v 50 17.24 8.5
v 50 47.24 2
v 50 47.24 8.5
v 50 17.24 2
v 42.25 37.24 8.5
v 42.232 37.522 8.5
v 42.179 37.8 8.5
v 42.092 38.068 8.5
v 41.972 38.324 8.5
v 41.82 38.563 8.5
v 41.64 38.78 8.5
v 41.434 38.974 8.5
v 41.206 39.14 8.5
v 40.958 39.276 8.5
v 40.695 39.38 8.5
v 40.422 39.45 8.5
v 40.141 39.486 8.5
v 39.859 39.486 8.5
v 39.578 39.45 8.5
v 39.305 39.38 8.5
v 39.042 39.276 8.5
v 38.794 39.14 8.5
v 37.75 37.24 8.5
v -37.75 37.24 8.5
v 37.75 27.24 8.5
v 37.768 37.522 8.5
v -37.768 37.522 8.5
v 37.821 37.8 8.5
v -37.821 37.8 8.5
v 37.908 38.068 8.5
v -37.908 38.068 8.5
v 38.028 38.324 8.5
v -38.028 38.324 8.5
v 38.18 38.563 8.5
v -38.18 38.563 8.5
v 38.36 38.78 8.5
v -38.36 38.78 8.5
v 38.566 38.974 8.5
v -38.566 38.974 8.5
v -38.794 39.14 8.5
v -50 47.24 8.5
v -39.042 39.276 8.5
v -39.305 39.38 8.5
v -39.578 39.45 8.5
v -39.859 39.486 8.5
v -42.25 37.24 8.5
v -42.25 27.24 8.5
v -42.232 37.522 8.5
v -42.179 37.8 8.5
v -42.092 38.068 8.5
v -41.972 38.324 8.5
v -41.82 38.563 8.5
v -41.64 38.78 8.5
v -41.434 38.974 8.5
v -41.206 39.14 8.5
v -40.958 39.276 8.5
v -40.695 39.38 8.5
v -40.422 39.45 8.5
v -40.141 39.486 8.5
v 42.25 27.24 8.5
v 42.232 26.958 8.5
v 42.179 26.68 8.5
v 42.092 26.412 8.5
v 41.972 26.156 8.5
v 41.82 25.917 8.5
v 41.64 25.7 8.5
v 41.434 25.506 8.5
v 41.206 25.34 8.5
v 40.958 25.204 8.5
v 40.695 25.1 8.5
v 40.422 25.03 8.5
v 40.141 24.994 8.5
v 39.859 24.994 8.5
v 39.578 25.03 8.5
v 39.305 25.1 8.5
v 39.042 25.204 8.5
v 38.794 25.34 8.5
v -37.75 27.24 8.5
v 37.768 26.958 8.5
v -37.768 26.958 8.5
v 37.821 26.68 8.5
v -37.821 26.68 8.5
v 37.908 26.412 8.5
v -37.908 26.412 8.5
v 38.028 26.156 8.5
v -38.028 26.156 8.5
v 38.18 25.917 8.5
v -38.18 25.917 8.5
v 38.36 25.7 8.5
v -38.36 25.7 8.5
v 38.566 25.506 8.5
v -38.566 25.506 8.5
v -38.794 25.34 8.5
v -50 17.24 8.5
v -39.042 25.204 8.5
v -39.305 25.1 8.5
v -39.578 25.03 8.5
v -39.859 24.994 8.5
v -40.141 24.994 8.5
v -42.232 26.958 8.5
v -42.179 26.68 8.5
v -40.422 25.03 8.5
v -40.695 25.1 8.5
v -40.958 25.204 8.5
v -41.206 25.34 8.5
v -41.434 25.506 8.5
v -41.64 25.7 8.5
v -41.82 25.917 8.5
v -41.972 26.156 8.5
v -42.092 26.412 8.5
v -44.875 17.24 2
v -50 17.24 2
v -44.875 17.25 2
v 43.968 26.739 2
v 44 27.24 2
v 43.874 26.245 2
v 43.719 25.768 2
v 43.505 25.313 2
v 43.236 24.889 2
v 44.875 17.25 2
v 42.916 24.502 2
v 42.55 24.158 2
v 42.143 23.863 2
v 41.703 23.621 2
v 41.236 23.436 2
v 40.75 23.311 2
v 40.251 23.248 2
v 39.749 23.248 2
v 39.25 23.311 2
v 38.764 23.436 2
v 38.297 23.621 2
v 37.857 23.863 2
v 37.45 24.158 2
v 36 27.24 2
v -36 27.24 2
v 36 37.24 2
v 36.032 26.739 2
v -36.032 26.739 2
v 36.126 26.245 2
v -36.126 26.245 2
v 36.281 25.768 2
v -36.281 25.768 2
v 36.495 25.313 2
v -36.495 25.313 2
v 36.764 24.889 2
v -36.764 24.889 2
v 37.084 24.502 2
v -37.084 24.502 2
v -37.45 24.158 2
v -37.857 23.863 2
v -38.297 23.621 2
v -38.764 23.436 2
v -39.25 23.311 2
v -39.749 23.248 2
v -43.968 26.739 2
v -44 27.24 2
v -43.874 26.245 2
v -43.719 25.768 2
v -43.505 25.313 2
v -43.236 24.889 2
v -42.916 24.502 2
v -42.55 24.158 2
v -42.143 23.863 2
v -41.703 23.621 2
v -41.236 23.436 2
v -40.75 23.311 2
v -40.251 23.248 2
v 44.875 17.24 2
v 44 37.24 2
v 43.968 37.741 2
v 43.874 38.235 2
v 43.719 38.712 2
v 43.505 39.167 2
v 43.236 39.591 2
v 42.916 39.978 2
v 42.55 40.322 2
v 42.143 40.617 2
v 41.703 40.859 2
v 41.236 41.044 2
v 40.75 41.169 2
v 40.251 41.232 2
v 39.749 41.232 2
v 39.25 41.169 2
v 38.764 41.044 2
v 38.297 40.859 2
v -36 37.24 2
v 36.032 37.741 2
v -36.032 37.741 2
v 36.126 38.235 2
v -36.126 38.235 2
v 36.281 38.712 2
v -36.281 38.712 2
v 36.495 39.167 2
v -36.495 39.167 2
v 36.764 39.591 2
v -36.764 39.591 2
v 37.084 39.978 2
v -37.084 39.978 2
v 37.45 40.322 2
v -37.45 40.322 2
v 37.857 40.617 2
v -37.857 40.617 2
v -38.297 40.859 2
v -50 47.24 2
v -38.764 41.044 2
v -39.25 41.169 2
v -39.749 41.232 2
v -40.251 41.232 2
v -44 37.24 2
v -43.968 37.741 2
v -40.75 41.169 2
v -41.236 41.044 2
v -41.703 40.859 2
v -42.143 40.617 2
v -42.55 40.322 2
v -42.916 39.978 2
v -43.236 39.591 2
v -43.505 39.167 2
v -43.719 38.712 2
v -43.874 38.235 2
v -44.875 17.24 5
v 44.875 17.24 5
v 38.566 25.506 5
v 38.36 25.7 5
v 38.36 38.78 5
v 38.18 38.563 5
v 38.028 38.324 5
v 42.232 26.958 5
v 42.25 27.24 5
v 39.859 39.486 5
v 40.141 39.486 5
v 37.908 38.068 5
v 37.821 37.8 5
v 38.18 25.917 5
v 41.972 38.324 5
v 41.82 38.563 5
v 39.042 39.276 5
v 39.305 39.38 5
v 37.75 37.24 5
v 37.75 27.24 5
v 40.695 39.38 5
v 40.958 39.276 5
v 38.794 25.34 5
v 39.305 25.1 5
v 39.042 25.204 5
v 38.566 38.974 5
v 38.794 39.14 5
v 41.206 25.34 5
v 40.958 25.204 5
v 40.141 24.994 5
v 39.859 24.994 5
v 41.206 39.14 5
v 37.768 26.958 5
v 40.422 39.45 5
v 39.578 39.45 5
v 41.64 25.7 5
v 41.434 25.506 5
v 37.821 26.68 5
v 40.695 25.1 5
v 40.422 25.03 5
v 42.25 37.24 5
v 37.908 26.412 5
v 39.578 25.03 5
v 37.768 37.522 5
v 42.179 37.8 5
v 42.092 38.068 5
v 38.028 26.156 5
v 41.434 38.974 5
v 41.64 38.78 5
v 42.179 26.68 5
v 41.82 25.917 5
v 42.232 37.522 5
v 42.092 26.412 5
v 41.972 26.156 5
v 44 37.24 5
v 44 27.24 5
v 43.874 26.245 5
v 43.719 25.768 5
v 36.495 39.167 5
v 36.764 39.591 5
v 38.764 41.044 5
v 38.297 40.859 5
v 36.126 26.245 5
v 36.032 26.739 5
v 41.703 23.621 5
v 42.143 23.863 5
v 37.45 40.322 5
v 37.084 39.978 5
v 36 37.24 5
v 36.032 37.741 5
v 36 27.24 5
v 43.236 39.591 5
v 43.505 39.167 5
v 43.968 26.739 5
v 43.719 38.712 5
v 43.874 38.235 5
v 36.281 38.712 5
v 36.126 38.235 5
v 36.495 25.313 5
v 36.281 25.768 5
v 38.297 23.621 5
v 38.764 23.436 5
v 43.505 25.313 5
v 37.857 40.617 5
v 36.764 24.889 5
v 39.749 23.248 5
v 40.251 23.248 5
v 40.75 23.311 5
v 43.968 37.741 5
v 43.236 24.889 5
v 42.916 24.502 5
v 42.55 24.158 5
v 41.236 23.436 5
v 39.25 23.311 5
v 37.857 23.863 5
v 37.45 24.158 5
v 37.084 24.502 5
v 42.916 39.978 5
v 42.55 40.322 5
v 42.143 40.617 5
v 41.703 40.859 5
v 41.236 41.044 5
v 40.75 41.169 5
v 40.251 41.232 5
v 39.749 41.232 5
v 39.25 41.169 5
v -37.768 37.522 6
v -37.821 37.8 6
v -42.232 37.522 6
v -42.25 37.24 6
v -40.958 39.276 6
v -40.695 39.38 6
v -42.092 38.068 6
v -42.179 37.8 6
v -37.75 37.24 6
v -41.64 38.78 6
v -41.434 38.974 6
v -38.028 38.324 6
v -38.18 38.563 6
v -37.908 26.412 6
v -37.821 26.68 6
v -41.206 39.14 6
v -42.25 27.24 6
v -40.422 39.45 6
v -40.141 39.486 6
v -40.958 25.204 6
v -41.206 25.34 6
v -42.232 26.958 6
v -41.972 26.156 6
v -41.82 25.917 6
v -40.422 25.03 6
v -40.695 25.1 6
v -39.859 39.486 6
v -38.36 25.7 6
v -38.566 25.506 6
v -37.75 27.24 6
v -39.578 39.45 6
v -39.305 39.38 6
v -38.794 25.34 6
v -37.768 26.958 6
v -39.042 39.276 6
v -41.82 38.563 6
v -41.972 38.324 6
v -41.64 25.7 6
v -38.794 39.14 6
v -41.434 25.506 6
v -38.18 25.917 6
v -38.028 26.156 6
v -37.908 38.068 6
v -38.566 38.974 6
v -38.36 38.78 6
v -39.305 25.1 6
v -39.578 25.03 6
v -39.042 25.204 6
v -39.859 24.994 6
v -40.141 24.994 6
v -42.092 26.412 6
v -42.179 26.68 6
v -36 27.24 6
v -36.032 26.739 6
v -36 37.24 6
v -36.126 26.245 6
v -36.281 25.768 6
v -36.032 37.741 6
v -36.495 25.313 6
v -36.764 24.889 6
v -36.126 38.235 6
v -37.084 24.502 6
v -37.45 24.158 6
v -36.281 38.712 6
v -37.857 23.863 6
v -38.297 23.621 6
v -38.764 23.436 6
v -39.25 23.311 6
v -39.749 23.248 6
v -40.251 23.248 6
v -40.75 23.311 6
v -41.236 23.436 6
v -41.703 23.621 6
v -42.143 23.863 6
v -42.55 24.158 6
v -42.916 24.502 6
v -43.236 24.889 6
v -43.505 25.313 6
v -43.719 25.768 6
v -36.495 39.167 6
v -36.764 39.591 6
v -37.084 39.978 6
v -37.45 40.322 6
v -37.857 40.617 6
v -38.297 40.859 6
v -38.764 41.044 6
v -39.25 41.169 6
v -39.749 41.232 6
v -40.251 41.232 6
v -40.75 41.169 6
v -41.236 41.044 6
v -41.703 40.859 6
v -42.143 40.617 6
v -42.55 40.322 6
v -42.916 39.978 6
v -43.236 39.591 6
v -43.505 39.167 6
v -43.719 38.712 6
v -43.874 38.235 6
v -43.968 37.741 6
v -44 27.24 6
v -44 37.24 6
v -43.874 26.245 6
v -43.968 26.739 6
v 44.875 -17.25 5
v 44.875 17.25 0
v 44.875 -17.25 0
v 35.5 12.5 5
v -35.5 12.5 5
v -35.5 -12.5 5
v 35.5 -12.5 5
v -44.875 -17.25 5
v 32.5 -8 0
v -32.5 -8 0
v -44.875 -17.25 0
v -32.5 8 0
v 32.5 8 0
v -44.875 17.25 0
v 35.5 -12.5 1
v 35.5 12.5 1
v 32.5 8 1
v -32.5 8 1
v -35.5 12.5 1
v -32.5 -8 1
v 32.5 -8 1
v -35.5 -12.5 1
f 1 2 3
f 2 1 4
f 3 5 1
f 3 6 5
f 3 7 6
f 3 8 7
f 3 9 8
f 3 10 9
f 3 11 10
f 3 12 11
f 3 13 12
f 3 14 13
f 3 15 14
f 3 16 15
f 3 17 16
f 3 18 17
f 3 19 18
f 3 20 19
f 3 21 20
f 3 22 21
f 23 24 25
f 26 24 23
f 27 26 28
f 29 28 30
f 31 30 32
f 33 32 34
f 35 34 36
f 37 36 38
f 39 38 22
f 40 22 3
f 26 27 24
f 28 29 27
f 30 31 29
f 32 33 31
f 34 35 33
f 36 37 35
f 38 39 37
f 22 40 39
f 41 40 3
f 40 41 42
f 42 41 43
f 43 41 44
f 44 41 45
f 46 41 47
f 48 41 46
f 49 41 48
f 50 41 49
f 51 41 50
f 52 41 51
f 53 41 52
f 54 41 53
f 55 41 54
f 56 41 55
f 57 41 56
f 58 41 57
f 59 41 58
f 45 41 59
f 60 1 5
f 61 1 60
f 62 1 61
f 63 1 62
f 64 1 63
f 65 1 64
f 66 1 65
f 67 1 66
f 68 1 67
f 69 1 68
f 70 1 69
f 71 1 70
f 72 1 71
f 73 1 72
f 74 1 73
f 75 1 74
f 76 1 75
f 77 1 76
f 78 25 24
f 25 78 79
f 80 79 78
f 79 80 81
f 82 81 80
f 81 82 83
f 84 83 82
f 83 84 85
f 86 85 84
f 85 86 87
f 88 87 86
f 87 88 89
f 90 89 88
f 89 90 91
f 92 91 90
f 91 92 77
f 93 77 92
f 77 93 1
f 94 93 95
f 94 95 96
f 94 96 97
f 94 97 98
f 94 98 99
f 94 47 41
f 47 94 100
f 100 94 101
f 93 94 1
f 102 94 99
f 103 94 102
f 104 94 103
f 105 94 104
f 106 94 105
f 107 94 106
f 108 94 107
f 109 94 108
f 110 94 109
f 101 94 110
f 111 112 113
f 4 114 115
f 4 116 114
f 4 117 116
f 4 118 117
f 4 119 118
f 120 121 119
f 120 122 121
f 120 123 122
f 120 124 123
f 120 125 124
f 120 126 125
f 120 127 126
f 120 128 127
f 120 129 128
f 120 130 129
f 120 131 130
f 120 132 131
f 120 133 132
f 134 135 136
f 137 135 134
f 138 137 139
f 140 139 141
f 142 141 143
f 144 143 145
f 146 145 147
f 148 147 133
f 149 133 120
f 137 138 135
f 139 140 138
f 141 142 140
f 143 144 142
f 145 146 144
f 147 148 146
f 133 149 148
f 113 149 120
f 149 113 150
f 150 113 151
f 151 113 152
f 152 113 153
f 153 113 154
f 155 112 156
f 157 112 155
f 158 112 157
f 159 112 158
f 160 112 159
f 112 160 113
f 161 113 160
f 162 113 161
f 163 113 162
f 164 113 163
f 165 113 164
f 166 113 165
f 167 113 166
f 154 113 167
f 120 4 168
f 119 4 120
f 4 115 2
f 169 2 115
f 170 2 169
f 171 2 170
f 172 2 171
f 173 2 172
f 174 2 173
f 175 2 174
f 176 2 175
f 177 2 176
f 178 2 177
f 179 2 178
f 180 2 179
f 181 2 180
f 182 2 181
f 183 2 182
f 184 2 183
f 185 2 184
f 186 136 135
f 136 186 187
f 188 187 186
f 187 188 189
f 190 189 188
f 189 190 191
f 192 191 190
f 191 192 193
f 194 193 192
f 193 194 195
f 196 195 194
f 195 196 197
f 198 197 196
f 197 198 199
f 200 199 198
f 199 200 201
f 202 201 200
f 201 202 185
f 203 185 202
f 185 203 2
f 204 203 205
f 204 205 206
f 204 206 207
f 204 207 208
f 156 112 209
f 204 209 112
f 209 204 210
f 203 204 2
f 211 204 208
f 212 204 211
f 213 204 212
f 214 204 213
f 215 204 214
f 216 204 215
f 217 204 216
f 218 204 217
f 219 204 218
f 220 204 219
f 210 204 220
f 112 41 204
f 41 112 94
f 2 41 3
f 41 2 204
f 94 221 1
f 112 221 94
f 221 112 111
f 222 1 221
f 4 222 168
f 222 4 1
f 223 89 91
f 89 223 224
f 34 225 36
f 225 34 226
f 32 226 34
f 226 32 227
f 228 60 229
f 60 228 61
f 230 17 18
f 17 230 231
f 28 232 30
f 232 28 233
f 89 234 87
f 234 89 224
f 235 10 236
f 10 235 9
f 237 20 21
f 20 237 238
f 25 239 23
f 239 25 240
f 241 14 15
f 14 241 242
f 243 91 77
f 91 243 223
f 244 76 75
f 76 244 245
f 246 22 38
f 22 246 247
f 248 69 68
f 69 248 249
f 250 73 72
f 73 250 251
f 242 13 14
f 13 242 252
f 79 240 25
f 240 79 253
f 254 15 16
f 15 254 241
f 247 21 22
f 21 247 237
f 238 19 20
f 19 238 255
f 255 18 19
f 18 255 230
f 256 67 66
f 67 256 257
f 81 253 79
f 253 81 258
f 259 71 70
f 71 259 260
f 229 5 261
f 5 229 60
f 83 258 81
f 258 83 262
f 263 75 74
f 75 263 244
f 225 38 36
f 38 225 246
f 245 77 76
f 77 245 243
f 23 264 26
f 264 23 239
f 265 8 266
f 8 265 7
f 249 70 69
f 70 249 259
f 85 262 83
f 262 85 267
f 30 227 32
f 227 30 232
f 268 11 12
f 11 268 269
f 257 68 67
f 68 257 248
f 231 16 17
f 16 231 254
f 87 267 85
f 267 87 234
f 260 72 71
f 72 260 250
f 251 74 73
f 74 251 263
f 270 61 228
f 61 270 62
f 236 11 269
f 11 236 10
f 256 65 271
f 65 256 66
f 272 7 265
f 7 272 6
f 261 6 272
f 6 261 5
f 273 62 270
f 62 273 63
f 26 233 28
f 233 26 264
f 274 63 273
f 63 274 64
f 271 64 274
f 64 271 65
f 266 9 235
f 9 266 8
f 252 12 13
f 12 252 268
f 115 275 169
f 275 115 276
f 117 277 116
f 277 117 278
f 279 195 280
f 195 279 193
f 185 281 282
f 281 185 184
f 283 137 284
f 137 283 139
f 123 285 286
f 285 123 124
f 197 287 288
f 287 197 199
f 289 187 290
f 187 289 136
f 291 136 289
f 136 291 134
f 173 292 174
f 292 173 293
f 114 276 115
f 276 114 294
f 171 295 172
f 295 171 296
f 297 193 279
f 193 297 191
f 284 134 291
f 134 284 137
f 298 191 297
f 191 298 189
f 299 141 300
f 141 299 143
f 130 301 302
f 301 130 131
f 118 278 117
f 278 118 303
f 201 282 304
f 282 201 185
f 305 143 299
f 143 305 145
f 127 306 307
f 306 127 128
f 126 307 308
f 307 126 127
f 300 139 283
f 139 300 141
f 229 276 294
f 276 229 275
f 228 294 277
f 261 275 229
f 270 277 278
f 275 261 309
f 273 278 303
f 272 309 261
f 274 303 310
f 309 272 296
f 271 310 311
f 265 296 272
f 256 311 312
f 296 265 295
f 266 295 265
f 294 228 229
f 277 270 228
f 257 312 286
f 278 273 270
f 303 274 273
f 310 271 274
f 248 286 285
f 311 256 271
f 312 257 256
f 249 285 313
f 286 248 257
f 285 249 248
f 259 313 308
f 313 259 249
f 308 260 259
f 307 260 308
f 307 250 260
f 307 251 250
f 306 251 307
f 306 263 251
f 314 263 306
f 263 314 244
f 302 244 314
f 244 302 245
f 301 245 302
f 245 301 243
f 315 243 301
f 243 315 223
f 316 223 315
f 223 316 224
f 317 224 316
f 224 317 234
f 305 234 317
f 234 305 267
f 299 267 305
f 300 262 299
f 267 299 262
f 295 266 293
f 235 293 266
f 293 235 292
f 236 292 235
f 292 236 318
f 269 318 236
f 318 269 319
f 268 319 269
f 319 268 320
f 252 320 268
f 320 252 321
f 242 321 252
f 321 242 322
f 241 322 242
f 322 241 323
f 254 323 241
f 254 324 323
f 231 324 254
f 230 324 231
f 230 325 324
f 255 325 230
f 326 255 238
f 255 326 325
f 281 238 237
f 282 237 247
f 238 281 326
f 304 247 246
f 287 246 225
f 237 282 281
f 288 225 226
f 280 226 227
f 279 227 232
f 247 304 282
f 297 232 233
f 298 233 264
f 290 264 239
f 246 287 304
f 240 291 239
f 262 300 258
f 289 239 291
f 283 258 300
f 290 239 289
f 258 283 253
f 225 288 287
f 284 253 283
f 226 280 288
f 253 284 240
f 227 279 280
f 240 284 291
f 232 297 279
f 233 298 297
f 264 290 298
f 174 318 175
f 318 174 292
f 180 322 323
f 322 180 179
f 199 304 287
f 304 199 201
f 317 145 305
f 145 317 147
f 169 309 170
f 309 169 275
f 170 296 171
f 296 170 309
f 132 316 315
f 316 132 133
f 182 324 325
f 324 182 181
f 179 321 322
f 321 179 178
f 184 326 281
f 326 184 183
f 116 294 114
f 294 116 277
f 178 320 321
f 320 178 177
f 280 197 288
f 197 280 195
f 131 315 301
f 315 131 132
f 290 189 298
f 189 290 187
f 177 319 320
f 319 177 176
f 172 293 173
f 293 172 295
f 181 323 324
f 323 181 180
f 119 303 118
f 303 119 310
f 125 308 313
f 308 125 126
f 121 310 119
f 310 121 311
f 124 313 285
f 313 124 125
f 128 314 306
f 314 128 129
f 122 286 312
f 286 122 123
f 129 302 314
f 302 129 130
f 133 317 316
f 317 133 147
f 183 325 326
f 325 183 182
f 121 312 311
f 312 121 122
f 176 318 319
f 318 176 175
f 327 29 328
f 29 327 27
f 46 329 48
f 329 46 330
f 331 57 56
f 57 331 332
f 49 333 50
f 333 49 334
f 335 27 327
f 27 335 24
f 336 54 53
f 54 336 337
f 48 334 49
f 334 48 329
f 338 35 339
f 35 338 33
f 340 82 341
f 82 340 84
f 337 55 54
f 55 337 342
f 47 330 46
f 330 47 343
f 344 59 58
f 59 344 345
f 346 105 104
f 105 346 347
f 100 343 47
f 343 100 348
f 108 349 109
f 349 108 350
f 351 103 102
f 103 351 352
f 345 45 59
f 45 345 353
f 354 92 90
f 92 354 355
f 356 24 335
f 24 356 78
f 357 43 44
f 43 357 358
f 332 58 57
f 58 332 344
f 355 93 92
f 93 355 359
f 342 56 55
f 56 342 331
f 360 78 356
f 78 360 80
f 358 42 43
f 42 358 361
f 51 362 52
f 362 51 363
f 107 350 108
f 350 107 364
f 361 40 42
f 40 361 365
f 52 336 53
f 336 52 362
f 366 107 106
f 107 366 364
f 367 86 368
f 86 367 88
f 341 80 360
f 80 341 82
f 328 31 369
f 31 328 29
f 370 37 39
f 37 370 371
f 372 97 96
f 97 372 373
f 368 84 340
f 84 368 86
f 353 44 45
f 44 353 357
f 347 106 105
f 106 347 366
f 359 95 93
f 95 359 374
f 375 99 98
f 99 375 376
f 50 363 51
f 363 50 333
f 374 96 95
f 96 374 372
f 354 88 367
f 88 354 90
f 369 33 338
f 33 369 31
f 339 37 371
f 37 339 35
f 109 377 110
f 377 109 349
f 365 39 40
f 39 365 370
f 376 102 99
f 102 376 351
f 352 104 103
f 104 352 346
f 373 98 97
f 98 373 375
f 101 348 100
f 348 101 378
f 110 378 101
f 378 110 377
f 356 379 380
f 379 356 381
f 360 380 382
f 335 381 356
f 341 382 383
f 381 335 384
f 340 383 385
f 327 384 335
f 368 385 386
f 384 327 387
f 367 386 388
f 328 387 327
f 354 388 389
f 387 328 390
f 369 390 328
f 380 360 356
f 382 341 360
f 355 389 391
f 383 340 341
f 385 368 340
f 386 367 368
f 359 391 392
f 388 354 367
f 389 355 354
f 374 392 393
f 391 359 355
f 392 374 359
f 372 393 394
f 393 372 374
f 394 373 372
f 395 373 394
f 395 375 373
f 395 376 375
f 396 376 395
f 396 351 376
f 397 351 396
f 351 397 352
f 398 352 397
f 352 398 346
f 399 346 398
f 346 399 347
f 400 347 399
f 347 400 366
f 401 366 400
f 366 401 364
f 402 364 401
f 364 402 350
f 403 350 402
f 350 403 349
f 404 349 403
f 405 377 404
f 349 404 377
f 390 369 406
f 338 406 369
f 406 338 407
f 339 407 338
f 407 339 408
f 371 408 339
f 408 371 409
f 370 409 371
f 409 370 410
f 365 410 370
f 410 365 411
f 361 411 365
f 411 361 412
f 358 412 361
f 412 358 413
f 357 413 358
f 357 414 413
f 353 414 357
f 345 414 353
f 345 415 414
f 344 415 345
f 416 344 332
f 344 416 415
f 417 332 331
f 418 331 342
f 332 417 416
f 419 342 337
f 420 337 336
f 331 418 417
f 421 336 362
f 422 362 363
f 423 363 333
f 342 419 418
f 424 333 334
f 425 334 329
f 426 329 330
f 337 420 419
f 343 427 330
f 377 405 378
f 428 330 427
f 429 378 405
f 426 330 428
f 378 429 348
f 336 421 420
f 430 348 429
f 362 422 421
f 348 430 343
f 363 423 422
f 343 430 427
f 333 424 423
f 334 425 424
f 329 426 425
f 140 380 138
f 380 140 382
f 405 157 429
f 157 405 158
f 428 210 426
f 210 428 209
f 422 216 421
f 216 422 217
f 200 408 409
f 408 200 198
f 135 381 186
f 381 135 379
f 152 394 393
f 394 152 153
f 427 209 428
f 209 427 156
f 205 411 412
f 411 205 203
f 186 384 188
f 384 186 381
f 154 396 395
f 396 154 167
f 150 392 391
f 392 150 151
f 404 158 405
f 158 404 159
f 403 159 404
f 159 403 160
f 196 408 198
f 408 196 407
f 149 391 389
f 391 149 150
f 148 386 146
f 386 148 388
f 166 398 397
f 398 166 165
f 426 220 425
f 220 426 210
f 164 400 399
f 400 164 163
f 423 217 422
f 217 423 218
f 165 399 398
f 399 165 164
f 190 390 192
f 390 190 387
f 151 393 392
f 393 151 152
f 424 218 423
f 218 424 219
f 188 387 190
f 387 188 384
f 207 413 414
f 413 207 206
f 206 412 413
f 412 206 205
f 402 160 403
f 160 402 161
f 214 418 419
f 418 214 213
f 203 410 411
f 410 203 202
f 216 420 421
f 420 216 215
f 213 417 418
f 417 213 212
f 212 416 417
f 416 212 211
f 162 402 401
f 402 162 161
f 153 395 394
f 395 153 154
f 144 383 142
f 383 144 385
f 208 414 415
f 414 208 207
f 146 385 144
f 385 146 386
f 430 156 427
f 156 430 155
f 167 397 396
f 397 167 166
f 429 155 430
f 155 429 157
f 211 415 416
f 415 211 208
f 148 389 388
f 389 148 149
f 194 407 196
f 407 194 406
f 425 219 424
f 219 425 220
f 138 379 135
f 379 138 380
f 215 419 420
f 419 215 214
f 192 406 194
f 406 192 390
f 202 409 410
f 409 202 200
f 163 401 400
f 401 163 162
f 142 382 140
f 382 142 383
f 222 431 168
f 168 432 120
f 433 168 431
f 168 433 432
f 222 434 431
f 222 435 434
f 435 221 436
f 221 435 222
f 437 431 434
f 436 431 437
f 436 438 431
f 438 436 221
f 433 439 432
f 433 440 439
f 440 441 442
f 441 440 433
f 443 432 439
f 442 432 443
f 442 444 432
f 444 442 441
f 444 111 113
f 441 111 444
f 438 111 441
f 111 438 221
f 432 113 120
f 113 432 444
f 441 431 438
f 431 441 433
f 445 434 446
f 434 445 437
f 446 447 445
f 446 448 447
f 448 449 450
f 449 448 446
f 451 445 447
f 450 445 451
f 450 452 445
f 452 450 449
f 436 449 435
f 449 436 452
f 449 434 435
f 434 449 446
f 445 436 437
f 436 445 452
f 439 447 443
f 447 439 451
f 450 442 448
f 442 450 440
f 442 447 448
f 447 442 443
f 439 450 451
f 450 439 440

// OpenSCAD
$fn=50;

bracket_bezel_infill_thickness = 1;
bracket_bezel_thickness = 5;
difference() {
    union() {
       translate([0,0,bracket_bezel_thickness/2]) cube([89.75, 34.5,bracket_bezel_thickness], center=true);
            
        
        
       translate([0,30/2 + 34.5/2 - 0.01,2 ]) {
           difference() {
           translate([0,0, (bracket_bezel_thickness+1.5)/2]) cube([100,30,bracket_bezel_thickness+1.5],center=true);
           
               //slot hole inner
               hull() {
                   translate([40,-5,-5]) cylinder(d=4.5, h=50);
                   translate([40,5,-5]) cylinder(d=4.5, h=50);
               }
                hull() {
                   translate([40,-5,-1]) cylinder(d=8, h=4);
                   translate([40,5,-1]) cylinder(d=8, h=4);
                }

               
               //slot hole inner
                hull() {
                   translate([-40,-5,-5]) cylinder(d=4.5, h=50);
                   translate([-40,5,-5]) cylinder(d=4.5, h=50);
                }
                 hull() {
                   translate([-40,-5,0]) cylinder(d=8, h=4);
                   translate([-40,5,0]) cylinder(d=8, h=4);
                }
                
           }
       }
    }
  //  translate([(100-65)/2,40,0]) square ([65,70]);

translate([0,0,20/2 +bracket_bezel_infill_thickness]) cube([71, 25, 20], center=true);
translate([0,0,-1]) cube([71-6, 25-9, 50], center=true);


}
